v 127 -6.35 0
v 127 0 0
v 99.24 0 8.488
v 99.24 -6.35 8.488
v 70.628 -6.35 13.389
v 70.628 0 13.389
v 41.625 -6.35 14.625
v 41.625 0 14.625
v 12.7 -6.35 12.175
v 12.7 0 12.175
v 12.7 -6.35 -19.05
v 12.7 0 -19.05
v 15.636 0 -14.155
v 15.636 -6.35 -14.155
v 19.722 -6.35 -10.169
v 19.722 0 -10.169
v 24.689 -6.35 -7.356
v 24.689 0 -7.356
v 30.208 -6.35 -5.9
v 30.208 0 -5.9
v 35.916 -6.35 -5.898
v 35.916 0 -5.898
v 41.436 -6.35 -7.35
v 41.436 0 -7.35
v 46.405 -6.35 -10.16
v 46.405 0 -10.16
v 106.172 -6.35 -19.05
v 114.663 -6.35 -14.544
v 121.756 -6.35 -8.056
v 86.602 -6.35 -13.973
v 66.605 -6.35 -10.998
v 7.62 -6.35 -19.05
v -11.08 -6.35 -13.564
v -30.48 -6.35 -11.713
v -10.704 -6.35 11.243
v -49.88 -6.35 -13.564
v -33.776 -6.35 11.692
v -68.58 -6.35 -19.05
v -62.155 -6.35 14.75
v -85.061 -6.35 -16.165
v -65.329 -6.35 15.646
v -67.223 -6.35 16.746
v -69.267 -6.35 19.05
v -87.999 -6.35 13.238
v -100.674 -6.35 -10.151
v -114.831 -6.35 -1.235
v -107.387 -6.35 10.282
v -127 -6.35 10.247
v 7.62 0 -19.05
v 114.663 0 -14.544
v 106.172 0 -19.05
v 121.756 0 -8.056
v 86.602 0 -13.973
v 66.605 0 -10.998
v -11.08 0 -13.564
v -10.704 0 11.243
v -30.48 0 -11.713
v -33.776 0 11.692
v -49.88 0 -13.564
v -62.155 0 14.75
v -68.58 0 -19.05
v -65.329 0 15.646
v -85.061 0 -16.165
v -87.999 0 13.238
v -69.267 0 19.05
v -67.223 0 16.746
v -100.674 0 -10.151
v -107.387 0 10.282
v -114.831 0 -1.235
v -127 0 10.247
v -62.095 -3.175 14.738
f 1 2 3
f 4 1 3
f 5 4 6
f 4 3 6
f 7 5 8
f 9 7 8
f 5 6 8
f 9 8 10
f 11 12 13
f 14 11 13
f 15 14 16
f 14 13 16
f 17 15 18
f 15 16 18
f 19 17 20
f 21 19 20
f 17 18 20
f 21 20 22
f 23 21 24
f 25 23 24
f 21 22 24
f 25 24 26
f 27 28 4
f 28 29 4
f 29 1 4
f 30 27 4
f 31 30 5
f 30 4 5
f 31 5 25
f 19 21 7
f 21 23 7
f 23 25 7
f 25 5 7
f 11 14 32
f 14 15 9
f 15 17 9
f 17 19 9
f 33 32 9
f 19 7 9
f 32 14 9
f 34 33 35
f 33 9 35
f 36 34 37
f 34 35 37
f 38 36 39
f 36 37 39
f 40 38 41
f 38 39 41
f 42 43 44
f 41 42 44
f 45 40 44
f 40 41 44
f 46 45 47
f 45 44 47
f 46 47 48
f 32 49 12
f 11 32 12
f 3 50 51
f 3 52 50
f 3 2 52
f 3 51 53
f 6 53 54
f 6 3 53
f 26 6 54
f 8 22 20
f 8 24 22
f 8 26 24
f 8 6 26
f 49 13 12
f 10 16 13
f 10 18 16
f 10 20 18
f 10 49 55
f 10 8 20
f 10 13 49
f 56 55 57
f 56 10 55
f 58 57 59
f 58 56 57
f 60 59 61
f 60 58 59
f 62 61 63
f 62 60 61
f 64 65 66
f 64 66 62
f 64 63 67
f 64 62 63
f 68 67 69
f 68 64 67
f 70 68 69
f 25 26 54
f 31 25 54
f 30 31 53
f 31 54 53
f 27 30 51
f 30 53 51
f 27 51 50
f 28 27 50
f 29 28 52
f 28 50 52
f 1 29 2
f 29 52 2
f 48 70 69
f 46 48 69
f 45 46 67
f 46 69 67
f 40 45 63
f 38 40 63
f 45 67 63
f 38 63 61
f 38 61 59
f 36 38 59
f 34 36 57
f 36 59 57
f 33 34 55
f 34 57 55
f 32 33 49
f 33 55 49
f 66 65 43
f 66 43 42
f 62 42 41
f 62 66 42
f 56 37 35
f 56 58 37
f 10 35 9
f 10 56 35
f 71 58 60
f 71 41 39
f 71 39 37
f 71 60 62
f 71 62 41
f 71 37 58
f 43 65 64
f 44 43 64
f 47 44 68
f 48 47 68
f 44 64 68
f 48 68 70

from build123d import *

# Parameters (mm, degrees)
F1_DEPTH = 6.35


with BuildPart() as f1:
    # F0 (on Front) → F1 (new body)
    with BuildSketch(Plane.XZ):
        with BuildLine():
            add(Edge.make_bspline(
                [(-69.2670494318, 19.05), (-67.3128640728, 16.2248080447), (-60.969426566, 13.3476320625), (-22.1680297811, 9.7510011569), (12.7, 12.1750152693)],
                knots=[0, 0, 0, 0, 0.2505960164, 1, 1, 1, 1], degree=3))
            ThreePointArc((-69.2670494318, 19.05), (-97.6377356755, 11.397017146), (-127, 10.2474875748))
            ThreePointArc((-127, 10.2474875748), (-100.6736295618, -10.1512932616), (-68.58, -19.05))
            ThreePointArc((-68.58, -19.05), (-30.48, -11.7126104241), (7.62, -19.05))
            Line((7.62, -19.05), (12.7, -19.05))
            ThreePointArc((12.7, -19.05), (27.4012824935, -6.4499702137), (46.4045489641, -10.16))
            ThreePointArc((46.4045489641, -10.16), (76.642998398, -12.2201918698), (106.172, -19.05))
            ThreePointArc((106.172, -19.05), (118.4151863409, -11.5249103993), (127, 0))
            ThreePointArc((127, 0), (70.6277336889, 13.3889326164), (12.7, 12.1750152693))
        make_face()
    extrude(amount=F1_DEPTH)


solid = f1.part
